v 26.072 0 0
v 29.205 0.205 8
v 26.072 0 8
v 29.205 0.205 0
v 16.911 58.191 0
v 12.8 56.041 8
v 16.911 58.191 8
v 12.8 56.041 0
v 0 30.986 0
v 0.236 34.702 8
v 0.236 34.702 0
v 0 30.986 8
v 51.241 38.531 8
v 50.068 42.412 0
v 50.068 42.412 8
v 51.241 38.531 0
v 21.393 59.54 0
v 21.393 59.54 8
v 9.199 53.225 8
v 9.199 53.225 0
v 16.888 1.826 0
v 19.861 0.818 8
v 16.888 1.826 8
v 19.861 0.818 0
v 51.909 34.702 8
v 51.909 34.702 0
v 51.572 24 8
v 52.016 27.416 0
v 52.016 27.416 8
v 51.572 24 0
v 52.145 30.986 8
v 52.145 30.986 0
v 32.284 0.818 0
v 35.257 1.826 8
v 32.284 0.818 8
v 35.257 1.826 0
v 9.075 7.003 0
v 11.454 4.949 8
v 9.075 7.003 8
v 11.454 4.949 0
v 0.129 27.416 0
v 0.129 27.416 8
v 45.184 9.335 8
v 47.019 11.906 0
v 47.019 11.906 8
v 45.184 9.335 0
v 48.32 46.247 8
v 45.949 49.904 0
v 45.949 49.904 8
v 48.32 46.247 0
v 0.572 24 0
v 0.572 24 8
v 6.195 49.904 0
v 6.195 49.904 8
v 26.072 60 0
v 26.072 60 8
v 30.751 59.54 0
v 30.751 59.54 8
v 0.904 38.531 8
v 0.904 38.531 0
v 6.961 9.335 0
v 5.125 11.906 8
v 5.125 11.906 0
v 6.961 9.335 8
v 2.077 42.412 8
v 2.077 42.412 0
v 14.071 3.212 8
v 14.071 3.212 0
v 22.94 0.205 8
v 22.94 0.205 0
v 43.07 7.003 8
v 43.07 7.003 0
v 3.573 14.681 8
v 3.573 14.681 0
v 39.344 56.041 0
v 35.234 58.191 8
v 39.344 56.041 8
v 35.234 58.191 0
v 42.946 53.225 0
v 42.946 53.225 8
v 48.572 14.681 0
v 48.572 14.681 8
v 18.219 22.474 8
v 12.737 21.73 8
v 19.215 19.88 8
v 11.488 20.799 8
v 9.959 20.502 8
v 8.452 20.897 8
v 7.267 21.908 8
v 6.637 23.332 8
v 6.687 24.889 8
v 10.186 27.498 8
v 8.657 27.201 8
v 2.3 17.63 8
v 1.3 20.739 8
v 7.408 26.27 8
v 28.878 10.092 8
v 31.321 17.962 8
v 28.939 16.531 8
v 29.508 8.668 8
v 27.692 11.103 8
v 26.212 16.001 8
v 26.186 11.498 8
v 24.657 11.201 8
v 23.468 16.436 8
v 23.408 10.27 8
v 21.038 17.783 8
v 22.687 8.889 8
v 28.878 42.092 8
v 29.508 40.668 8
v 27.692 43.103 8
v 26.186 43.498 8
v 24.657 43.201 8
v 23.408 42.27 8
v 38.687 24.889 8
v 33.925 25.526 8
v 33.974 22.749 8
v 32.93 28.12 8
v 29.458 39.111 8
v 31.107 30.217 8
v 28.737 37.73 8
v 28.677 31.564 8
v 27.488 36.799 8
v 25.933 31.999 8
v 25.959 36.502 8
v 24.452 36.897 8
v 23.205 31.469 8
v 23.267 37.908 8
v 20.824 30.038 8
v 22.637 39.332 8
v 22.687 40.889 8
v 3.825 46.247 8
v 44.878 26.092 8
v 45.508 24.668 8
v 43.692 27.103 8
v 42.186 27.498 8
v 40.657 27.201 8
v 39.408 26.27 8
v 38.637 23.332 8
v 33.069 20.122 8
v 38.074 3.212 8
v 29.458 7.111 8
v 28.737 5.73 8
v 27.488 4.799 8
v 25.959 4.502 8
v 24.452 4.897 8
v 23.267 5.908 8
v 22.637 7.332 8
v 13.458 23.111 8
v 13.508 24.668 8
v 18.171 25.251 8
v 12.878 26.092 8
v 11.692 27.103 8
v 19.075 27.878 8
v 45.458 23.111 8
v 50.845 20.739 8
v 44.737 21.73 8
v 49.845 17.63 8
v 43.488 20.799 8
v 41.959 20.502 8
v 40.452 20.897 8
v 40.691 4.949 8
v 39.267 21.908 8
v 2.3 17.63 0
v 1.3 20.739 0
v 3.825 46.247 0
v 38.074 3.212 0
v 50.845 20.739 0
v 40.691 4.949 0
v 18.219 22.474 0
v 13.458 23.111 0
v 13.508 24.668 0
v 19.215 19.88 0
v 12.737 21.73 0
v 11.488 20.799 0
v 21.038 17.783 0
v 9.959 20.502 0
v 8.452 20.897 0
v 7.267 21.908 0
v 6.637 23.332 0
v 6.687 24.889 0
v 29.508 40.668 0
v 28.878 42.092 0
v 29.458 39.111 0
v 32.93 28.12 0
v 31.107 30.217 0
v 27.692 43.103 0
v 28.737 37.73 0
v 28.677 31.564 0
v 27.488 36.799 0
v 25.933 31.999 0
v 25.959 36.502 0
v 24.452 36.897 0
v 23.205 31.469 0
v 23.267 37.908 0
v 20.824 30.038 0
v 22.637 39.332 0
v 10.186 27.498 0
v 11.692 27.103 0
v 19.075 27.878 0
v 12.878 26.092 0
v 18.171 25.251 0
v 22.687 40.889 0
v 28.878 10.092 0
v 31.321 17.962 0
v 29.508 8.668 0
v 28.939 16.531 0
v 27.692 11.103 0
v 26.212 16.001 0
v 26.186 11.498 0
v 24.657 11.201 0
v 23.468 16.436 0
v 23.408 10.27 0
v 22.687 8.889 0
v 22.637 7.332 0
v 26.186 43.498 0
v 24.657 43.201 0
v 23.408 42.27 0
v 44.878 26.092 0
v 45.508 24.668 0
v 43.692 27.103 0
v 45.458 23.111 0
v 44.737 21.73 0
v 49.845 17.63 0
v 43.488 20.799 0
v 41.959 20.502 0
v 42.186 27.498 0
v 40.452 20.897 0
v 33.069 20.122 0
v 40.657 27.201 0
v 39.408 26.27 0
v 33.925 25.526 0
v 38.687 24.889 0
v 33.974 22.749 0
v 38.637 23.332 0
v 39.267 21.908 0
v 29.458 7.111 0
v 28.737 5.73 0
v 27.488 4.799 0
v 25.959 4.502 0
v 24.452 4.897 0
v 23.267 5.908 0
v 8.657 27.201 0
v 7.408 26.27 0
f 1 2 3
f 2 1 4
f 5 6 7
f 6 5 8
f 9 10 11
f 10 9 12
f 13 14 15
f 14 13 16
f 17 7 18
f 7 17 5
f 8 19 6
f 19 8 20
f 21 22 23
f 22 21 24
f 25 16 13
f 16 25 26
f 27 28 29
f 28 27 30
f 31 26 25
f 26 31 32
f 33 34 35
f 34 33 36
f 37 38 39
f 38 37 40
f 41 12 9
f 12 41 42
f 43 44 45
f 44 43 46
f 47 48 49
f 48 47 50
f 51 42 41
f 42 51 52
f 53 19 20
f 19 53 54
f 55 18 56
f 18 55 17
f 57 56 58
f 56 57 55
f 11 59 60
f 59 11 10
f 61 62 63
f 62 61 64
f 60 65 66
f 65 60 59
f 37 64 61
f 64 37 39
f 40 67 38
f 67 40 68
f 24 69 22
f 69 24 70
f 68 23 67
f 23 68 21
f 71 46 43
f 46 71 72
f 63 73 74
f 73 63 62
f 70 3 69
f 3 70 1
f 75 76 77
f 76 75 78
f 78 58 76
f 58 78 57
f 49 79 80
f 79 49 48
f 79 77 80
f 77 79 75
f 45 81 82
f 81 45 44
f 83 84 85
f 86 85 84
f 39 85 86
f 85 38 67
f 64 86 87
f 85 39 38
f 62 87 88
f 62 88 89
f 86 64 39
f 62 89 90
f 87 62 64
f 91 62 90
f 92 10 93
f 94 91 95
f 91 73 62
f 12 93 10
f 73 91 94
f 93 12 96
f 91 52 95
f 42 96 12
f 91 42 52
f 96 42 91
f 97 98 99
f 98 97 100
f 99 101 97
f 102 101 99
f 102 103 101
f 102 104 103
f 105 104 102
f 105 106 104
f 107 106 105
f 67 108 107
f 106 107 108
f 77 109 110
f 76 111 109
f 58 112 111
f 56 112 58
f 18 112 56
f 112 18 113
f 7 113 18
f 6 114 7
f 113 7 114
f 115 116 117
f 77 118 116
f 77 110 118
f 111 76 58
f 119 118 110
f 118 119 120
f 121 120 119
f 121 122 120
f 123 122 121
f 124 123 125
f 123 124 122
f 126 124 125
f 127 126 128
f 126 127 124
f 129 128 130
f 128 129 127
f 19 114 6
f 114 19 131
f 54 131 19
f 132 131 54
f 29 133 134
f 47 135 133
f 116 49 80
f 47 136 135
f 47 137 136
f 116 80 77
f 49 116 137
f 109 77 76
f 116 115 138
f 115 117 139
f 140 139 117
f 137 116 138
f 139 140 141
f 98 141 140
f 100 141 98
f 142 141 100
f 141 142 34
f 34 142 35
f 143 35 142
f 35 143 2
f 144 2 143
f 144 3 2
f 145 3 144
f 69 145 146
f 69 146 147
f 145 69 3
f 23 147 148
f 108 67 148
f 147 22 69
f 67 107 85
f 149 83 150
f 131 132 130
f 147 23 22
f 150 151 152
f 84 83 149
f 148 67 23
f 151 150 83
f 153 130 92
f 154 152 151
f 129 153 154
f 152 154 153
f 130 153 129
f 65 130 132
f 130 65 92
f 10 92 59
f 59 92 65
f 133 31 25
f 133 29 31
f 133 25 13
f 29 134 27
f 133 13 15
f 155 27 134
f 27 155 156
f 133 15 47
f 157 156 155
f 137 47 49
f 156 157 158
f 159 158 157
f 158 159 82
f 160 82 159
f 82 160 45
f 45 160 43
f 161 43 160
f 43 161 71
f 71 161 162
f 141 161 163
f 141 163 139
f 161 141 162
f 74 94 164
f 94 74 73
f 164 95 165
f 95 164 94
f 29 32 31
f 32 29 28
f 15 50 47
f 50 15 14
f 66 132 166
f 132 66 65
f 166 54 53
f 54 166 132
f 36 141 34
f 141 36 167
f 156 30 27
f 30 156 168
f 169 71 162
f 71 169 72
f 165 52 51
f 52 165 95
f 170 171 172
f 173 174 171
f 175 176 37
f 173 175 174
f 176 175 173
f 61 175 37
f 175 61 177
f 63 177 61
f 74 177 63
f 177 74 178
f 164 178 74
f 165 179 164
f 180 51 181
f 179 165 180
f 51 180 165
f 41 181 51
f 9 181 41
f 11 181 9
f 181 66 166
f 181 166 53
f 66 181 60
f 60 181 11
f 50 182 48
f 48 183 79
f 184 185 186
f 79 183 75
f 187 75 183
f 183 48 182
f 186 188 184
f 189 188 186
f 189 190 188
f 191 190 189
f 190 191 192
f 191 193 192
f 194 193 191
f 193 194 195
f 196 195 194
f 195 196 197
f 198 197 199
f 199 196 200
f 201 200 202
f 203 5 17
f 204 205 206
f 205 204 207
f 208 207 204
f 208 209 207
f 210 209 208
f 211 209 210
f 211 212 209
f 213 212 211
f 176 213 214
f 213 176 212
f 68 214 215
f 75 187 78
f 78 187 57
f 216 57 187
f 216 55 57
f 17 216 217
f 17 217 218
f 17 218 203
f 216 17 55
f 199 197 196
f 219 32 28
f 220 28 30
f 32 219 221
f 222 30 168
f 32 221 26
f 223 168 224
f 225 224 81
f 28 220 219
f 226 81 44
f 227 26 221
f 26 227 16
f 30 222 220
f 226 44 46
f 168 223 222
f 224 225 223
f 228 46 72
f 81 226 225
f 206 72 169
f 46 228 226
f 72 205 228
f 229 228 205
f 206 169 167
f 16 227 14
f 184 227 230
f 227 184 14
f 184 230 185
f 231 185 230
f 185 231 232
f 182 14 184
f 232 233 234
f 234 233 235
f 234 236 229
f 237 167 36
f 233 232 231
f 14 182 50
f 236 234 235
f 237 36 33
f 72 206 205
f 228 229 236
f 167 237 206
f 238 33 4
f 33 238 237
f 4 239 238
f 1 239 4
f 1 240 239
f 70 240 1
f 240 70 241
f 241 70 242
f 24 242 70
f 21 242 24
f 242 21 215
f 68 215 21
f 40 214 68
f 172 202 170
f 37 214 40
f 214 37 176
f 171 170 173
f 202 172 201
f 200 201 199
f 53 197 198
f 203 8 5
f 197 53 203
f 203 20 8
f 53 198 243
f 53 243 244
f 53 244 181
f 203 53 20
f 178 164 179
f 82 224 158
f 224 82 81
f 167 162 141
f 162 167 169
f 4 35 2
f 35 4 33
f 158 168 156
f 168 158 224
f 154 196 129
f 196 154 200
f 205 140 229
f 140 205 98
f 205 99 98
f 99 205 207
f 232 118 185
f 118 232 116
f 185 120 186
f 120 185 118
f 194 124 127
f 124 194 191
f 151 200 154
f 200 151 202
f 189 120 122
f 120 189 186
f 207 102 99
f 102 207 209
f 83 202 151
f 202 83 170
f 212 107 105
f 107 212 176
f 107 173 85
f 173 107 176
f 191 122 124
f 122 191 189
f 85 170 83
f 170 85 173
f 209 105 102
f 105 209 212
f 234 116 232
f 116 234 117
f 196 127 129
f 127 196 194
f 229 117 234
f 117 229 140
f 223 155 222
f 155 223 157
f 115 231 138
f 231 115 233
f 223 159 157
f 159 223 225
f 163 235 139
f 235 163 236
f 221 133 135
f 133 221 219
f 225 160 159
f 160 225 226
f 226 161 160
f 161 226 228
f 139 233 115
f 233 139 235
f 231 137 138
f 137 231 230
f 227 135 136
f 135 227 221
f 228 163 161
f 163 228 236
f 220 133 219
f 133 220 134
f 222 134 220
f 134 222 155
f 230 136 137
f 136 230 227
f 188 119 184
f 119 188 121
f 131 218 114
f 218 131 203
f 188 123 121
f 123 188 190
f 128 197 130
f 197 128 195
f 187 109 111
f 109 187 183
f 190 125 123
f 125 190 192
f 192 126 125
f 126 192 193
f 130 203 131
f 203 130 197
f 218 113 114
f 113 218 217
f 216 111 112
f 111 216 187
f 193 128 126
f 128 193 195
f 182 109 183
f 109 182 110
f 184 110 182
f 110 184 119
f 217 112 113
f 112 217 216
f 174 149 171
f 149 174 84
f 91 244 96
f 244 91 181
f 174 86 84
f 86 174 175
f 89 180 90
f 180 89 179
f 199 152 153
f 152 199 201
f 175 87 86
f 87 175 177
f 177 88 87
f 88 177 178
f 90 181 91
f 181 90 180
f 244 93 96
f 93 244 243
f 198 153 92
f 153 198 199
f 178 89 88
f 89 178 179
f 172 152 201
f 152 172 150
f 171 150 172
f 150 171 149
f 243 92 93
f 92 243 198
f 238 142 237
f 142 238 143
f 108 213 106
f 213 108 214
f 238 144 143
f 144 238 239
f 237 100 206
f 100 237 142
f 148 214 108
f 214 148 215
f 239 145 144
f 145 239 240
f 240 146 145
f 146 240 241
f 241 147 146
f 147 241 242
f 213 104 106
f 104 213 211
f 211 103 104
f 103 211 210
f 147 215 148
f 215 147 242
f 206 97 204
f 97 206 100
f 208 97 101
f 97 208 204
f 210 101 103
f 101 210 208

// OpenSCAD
$fn = 32;

// ----------------------------------------------------------------------
// Cam plate: single_lobe cam, base R24
// ----------------------------------------------------------------------

// --- parameters (mm) ---
base_r = 24;              // base circle radius
lobe_h = 12;              // cam lobe rise
bore_r = 8;               // shaft bore radius
plate_t = 8;              // plate thickness, Z (extrusion height)
ring_r = 16;              // lightening ring radius
bolt_r = 3.5;             // lightening hole radius

profile = [[51.572, 24], [52.016, 27.416], [52.145, 30.986], [51.909, 34.702], [51.241, 38.531], [50.068, 42.412], [48.32, 46.247], [45.949, 49.904], [42.946, 53.225], [39.344, 56.041], [35.234, 58.191], [30.751, 59.54], [26.072, 60], [21.393, 59.54], [16.911, 58.191], [12.8, 56.041], [9.199, 53.225], [6.195, 49.904], [3.825, 46.247], [2.077, 42.412], [0.904, 38.531], [0.236, 34.702], [0, 30.986], [0.129, 27.416], [0.572, 24], [1.3, 20.739], [2.3, 17.63], [3.573, 14.681], [5.125, 11.906], [6.961, 9.335], [9.075, 7.003], [11.454, 4.949], [14.071, 3.212], [16.888, 1.826], [19.861, 0.818], [22.94, 0.205], [26.072, 0], [29.205, 0.205], [32.284, 0.818], [35.257, 1.826], [38.074, 3.212], [40.691, 4.949], [43.07, 7.003], [45.184, 9.335], [47.019, 11.906], [48.572, 14.681], [49.845, 17.63], [50.845, 20.739]];  // primary outline, 48 points, counter clockwise
void_1 = [[33.925, 25.526], [32.93, 28.12], [31.107, 30.217], [28.677, 31.564], [25.933, 31.999], [23.205, 31.469], [20.824, 30.038], [19.075, 27.878], [18.171, 25.251], [18.219, 22.474], [19.215, 19.88], [21.038, 17.783], [23.468, 16.436], [26.212, 16.001], [28.939, 16.531], [31.321, 17.962], [33.069, 20.122], [33.974, 22.749]];  // shaft bore, 18 points
void_2 = [[45.508, 24.668], [44.878, 26.092], [43.692, 27.103], [42.186, 27.498], [40.657, 27.201], [39.408, 26.27], [38.687, 24.889], [38.637, 23.332], [39.267, 21.908], [40.452, 20.897], [41.959, 20.502], [43.488, 20.799], [44.737, 21.73], [45.458, 23.111]];  // lightening hole 1, 14 points
void_3 = [[29.508, 40.668], [28.878, 42.092], [27.692, 43.103], [26.186, 43.498], [24.657, 43.201], [23.408, 42.27], [22.687, 40.889], [22.637, 39.332], [23.267, 37.908], [24.452, 36.897], [25.959, 36.502], [27.488, 36.799], [28.737, 37.73], [29.458, 39.111]];  // lightening hole 2, 14 points
void_4 = [[13.508, 24.668], [12.878, 26.092], [11.692, 27.103], [10.186, 27.498], [8.657, 27.201], [7.408, 26.27], [6.687, 24.889], [6.637, 23.332], [7.267, 21.908], [8.452, 20.897], [9.959, 20.502], [11.488, 20.799], [12.737, 21.73], [13.458, 23.111]];  // lightening hole 3, 14 points
void_5 = [[29.508, 8.668], [28.878, 10.092], [27.692, 11.103], [26.186, 11.498], [24.657, 11.201], [23.408, 10.27], [22.687, 8.889], [22.637, 7.332], [23.267, 5.908], [24.452, 4.897], [25.959, 4.502], [27.488, 4.799], [28.737, 5.73], [29.458, 7.111]];  // lightening hole 4, 14 points

// --- the one profile operation ---
difference() {
  linear_extrude(height = plate_t) polygon(points = profile);
  translate([0, 0, -1])
    linear_extrude(height = plate_t + 2) polygon(points = void_1);
  translate([0, 0, -1])
    linear_extrude(height = plate_t + 2) polygon(points = void_2);
  translate([0, 0, -1])
    linear_extrude(height = plate_t + 2) polygon(points = void_3);
  translate([0, 0, -1])
    linear_extrude(height = plate_t + 2) polygon(points = void_4);
  translate([0, 0, -1])
    linear_extrude(height = plate_t + 2) polygon(points = void_5);
}
